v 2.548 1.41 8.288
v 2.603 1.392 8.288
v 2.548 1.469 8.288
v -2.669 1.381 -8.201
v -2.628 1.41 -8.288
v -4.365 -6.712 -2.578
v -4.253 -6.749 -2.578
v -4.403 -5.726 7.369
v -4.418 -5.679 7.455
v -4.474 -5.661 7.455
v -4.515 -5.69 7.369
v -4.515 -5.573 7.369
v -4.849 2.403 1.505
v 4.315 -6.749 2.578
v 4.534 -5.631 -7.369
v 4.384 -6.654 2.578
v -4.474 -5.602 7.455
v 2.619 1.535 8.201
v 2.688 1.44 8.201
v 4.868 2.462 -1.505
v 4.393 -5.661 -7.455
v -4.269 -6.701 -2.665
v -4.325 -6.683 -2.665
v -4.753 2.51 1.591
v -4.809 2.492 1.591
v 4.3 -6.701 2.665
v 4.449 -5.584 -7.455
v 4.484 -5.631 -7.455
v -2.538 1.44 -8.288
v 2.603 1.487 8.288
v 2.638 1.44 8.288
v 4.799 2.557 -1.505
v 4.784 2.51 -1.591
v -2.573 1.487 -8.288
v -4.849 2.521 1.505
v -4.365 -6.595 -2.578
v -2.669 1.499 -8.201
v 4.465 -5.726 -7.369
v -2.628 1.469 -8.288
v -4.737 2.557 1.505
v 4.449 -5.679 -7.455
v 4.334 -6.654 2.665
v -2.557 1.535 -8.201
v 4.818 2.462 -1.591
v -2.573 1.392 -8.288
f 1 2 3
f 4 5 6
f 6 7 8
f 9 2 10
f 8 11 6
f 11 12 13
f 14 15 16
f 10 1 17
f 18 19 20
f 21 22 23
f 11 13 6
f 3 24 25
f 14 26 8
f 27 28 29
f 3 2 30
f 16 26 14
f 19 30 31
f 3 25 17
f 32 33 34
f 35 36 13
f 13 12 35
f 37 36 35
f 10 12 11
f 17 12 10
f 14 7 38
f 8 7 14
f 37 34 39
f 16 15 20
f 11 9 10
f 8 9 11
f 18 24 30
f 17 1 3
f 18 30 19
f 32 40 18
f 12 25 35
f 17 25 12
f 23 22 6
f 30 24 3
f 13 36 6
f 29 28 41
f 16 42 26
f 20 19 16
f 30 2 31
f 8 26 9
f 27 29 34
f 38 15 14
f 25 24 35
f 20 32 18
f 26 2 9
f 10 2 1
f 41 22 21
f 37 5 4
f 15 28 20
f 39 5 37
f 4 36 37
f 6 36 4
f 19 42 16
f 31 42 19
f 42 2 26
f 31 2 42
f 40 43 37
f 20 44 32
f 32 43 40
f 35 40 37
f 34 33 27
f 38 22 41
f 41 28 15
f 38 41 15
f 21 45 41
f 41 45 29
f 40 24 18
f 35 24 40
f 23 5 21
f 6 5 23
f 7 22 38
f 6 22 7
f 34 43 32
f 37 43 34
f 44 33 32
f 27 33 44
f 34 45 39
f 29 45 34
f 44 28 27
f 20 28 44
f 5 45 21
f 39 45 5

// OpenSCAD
// Auto-generated OpenSCAD file

    inner_points = 10*[[-0.44338942496134576, -0.5631291440797384, 0.736853897056677], [0.258799636920154, 0.14397761227363534, 0.8201038609809336], [-0.25879980510935924, 0.14397747926995844, -0.8201039287466986], [0.44338919068963584, -0.5631293267497549, -0.7368538292909121], [-0.4284186803233596, -0.6653657601513122, -0.2577935536208068], [0.47682137191431595, 0.24621402912054582, -0.1504703186366988], [-0.47682153054903015, 0.24621410252250395, 0.15047023127520603], [0.42841843649715877, -0.6653657507776369, 0.25779364098229957]];

    outer_points = 10*[[0.4999998558605856, -0.7822559369703687, 0.051219988111338946], [-0.5000001441354547, -0.7822559369703687, 0.05121717394836035], [1.5482124809305407e-06, 0.7495881473432447, -0.5501502552287388], [-1.259937611829569e-06, 0.8149237265974926, 0.4477130931690396], [0.6445843110171734, 0.20512235240503623, -0.01342867001218147], [-0.6445842354260318, 0.20512235240503623, -0.013432297942578041], [1.7722938158523331e-06, -0.2472366392743148, -0.629776537226624], [-1.8478849574399043e-06, -0.16300806553575767, 0.6566375051813835]];

    // Convex hull for inner set (I)
    module inner_hull() {
        hull() {
            for (p = inner_points) {
                translate(p) sphere(r=0.1);
            }
        }
    }

    // Convex hull for outer set (O) minus inner hull (O \ I)
    module outer_minus_inner() {
        difference() {
            hull() {
                for (p = outer_points) {
                    translate(p) sphere(r=0.1);
                }
            }
            inner_hull(); // Subtract inner hull
        }
    }

    // Convex hull for outer set (O) minus all translated inner hulls
    module outer_minus_AllTranslationInner() {
        difference() {
            hull() {
                for (p = outer_points) {
                    translate(p) sphere(r=0.1);
                }
            }
            hull() {
                translate([0,0,50]) inner_hull();
                translate([0,0,-50]) inner_hull();
            }; // Subtract translated inner hulls
        }
    }

    // Difference between outer_minus_inner and outer_minus_AllTranslationInner
    module outer_minus_inner_diff() {
        difference() {
            // Outer minus inner
            difference() {
                hull() {
                    for (p = outer_points) {
                        translate(p) sphere(r=0.1);
                    }
                }
                inner_hull();
            }

            // Subtract Outer minus AllTranslationInner
            difference() {
                hull() {
                    for (p = outer_points) {
                        translate(p) sphere(r=0.1);
                    }
                }
                hull() {
                    translate([0,0,50]) inner_hull();
                    translate([0,0,-50]) inner_hull();
                };
            }
        }
    }

    // Rendering all with colors applied
    color([1, 0, 0, 0.5]) inner_hull(); // Transparent red
    
